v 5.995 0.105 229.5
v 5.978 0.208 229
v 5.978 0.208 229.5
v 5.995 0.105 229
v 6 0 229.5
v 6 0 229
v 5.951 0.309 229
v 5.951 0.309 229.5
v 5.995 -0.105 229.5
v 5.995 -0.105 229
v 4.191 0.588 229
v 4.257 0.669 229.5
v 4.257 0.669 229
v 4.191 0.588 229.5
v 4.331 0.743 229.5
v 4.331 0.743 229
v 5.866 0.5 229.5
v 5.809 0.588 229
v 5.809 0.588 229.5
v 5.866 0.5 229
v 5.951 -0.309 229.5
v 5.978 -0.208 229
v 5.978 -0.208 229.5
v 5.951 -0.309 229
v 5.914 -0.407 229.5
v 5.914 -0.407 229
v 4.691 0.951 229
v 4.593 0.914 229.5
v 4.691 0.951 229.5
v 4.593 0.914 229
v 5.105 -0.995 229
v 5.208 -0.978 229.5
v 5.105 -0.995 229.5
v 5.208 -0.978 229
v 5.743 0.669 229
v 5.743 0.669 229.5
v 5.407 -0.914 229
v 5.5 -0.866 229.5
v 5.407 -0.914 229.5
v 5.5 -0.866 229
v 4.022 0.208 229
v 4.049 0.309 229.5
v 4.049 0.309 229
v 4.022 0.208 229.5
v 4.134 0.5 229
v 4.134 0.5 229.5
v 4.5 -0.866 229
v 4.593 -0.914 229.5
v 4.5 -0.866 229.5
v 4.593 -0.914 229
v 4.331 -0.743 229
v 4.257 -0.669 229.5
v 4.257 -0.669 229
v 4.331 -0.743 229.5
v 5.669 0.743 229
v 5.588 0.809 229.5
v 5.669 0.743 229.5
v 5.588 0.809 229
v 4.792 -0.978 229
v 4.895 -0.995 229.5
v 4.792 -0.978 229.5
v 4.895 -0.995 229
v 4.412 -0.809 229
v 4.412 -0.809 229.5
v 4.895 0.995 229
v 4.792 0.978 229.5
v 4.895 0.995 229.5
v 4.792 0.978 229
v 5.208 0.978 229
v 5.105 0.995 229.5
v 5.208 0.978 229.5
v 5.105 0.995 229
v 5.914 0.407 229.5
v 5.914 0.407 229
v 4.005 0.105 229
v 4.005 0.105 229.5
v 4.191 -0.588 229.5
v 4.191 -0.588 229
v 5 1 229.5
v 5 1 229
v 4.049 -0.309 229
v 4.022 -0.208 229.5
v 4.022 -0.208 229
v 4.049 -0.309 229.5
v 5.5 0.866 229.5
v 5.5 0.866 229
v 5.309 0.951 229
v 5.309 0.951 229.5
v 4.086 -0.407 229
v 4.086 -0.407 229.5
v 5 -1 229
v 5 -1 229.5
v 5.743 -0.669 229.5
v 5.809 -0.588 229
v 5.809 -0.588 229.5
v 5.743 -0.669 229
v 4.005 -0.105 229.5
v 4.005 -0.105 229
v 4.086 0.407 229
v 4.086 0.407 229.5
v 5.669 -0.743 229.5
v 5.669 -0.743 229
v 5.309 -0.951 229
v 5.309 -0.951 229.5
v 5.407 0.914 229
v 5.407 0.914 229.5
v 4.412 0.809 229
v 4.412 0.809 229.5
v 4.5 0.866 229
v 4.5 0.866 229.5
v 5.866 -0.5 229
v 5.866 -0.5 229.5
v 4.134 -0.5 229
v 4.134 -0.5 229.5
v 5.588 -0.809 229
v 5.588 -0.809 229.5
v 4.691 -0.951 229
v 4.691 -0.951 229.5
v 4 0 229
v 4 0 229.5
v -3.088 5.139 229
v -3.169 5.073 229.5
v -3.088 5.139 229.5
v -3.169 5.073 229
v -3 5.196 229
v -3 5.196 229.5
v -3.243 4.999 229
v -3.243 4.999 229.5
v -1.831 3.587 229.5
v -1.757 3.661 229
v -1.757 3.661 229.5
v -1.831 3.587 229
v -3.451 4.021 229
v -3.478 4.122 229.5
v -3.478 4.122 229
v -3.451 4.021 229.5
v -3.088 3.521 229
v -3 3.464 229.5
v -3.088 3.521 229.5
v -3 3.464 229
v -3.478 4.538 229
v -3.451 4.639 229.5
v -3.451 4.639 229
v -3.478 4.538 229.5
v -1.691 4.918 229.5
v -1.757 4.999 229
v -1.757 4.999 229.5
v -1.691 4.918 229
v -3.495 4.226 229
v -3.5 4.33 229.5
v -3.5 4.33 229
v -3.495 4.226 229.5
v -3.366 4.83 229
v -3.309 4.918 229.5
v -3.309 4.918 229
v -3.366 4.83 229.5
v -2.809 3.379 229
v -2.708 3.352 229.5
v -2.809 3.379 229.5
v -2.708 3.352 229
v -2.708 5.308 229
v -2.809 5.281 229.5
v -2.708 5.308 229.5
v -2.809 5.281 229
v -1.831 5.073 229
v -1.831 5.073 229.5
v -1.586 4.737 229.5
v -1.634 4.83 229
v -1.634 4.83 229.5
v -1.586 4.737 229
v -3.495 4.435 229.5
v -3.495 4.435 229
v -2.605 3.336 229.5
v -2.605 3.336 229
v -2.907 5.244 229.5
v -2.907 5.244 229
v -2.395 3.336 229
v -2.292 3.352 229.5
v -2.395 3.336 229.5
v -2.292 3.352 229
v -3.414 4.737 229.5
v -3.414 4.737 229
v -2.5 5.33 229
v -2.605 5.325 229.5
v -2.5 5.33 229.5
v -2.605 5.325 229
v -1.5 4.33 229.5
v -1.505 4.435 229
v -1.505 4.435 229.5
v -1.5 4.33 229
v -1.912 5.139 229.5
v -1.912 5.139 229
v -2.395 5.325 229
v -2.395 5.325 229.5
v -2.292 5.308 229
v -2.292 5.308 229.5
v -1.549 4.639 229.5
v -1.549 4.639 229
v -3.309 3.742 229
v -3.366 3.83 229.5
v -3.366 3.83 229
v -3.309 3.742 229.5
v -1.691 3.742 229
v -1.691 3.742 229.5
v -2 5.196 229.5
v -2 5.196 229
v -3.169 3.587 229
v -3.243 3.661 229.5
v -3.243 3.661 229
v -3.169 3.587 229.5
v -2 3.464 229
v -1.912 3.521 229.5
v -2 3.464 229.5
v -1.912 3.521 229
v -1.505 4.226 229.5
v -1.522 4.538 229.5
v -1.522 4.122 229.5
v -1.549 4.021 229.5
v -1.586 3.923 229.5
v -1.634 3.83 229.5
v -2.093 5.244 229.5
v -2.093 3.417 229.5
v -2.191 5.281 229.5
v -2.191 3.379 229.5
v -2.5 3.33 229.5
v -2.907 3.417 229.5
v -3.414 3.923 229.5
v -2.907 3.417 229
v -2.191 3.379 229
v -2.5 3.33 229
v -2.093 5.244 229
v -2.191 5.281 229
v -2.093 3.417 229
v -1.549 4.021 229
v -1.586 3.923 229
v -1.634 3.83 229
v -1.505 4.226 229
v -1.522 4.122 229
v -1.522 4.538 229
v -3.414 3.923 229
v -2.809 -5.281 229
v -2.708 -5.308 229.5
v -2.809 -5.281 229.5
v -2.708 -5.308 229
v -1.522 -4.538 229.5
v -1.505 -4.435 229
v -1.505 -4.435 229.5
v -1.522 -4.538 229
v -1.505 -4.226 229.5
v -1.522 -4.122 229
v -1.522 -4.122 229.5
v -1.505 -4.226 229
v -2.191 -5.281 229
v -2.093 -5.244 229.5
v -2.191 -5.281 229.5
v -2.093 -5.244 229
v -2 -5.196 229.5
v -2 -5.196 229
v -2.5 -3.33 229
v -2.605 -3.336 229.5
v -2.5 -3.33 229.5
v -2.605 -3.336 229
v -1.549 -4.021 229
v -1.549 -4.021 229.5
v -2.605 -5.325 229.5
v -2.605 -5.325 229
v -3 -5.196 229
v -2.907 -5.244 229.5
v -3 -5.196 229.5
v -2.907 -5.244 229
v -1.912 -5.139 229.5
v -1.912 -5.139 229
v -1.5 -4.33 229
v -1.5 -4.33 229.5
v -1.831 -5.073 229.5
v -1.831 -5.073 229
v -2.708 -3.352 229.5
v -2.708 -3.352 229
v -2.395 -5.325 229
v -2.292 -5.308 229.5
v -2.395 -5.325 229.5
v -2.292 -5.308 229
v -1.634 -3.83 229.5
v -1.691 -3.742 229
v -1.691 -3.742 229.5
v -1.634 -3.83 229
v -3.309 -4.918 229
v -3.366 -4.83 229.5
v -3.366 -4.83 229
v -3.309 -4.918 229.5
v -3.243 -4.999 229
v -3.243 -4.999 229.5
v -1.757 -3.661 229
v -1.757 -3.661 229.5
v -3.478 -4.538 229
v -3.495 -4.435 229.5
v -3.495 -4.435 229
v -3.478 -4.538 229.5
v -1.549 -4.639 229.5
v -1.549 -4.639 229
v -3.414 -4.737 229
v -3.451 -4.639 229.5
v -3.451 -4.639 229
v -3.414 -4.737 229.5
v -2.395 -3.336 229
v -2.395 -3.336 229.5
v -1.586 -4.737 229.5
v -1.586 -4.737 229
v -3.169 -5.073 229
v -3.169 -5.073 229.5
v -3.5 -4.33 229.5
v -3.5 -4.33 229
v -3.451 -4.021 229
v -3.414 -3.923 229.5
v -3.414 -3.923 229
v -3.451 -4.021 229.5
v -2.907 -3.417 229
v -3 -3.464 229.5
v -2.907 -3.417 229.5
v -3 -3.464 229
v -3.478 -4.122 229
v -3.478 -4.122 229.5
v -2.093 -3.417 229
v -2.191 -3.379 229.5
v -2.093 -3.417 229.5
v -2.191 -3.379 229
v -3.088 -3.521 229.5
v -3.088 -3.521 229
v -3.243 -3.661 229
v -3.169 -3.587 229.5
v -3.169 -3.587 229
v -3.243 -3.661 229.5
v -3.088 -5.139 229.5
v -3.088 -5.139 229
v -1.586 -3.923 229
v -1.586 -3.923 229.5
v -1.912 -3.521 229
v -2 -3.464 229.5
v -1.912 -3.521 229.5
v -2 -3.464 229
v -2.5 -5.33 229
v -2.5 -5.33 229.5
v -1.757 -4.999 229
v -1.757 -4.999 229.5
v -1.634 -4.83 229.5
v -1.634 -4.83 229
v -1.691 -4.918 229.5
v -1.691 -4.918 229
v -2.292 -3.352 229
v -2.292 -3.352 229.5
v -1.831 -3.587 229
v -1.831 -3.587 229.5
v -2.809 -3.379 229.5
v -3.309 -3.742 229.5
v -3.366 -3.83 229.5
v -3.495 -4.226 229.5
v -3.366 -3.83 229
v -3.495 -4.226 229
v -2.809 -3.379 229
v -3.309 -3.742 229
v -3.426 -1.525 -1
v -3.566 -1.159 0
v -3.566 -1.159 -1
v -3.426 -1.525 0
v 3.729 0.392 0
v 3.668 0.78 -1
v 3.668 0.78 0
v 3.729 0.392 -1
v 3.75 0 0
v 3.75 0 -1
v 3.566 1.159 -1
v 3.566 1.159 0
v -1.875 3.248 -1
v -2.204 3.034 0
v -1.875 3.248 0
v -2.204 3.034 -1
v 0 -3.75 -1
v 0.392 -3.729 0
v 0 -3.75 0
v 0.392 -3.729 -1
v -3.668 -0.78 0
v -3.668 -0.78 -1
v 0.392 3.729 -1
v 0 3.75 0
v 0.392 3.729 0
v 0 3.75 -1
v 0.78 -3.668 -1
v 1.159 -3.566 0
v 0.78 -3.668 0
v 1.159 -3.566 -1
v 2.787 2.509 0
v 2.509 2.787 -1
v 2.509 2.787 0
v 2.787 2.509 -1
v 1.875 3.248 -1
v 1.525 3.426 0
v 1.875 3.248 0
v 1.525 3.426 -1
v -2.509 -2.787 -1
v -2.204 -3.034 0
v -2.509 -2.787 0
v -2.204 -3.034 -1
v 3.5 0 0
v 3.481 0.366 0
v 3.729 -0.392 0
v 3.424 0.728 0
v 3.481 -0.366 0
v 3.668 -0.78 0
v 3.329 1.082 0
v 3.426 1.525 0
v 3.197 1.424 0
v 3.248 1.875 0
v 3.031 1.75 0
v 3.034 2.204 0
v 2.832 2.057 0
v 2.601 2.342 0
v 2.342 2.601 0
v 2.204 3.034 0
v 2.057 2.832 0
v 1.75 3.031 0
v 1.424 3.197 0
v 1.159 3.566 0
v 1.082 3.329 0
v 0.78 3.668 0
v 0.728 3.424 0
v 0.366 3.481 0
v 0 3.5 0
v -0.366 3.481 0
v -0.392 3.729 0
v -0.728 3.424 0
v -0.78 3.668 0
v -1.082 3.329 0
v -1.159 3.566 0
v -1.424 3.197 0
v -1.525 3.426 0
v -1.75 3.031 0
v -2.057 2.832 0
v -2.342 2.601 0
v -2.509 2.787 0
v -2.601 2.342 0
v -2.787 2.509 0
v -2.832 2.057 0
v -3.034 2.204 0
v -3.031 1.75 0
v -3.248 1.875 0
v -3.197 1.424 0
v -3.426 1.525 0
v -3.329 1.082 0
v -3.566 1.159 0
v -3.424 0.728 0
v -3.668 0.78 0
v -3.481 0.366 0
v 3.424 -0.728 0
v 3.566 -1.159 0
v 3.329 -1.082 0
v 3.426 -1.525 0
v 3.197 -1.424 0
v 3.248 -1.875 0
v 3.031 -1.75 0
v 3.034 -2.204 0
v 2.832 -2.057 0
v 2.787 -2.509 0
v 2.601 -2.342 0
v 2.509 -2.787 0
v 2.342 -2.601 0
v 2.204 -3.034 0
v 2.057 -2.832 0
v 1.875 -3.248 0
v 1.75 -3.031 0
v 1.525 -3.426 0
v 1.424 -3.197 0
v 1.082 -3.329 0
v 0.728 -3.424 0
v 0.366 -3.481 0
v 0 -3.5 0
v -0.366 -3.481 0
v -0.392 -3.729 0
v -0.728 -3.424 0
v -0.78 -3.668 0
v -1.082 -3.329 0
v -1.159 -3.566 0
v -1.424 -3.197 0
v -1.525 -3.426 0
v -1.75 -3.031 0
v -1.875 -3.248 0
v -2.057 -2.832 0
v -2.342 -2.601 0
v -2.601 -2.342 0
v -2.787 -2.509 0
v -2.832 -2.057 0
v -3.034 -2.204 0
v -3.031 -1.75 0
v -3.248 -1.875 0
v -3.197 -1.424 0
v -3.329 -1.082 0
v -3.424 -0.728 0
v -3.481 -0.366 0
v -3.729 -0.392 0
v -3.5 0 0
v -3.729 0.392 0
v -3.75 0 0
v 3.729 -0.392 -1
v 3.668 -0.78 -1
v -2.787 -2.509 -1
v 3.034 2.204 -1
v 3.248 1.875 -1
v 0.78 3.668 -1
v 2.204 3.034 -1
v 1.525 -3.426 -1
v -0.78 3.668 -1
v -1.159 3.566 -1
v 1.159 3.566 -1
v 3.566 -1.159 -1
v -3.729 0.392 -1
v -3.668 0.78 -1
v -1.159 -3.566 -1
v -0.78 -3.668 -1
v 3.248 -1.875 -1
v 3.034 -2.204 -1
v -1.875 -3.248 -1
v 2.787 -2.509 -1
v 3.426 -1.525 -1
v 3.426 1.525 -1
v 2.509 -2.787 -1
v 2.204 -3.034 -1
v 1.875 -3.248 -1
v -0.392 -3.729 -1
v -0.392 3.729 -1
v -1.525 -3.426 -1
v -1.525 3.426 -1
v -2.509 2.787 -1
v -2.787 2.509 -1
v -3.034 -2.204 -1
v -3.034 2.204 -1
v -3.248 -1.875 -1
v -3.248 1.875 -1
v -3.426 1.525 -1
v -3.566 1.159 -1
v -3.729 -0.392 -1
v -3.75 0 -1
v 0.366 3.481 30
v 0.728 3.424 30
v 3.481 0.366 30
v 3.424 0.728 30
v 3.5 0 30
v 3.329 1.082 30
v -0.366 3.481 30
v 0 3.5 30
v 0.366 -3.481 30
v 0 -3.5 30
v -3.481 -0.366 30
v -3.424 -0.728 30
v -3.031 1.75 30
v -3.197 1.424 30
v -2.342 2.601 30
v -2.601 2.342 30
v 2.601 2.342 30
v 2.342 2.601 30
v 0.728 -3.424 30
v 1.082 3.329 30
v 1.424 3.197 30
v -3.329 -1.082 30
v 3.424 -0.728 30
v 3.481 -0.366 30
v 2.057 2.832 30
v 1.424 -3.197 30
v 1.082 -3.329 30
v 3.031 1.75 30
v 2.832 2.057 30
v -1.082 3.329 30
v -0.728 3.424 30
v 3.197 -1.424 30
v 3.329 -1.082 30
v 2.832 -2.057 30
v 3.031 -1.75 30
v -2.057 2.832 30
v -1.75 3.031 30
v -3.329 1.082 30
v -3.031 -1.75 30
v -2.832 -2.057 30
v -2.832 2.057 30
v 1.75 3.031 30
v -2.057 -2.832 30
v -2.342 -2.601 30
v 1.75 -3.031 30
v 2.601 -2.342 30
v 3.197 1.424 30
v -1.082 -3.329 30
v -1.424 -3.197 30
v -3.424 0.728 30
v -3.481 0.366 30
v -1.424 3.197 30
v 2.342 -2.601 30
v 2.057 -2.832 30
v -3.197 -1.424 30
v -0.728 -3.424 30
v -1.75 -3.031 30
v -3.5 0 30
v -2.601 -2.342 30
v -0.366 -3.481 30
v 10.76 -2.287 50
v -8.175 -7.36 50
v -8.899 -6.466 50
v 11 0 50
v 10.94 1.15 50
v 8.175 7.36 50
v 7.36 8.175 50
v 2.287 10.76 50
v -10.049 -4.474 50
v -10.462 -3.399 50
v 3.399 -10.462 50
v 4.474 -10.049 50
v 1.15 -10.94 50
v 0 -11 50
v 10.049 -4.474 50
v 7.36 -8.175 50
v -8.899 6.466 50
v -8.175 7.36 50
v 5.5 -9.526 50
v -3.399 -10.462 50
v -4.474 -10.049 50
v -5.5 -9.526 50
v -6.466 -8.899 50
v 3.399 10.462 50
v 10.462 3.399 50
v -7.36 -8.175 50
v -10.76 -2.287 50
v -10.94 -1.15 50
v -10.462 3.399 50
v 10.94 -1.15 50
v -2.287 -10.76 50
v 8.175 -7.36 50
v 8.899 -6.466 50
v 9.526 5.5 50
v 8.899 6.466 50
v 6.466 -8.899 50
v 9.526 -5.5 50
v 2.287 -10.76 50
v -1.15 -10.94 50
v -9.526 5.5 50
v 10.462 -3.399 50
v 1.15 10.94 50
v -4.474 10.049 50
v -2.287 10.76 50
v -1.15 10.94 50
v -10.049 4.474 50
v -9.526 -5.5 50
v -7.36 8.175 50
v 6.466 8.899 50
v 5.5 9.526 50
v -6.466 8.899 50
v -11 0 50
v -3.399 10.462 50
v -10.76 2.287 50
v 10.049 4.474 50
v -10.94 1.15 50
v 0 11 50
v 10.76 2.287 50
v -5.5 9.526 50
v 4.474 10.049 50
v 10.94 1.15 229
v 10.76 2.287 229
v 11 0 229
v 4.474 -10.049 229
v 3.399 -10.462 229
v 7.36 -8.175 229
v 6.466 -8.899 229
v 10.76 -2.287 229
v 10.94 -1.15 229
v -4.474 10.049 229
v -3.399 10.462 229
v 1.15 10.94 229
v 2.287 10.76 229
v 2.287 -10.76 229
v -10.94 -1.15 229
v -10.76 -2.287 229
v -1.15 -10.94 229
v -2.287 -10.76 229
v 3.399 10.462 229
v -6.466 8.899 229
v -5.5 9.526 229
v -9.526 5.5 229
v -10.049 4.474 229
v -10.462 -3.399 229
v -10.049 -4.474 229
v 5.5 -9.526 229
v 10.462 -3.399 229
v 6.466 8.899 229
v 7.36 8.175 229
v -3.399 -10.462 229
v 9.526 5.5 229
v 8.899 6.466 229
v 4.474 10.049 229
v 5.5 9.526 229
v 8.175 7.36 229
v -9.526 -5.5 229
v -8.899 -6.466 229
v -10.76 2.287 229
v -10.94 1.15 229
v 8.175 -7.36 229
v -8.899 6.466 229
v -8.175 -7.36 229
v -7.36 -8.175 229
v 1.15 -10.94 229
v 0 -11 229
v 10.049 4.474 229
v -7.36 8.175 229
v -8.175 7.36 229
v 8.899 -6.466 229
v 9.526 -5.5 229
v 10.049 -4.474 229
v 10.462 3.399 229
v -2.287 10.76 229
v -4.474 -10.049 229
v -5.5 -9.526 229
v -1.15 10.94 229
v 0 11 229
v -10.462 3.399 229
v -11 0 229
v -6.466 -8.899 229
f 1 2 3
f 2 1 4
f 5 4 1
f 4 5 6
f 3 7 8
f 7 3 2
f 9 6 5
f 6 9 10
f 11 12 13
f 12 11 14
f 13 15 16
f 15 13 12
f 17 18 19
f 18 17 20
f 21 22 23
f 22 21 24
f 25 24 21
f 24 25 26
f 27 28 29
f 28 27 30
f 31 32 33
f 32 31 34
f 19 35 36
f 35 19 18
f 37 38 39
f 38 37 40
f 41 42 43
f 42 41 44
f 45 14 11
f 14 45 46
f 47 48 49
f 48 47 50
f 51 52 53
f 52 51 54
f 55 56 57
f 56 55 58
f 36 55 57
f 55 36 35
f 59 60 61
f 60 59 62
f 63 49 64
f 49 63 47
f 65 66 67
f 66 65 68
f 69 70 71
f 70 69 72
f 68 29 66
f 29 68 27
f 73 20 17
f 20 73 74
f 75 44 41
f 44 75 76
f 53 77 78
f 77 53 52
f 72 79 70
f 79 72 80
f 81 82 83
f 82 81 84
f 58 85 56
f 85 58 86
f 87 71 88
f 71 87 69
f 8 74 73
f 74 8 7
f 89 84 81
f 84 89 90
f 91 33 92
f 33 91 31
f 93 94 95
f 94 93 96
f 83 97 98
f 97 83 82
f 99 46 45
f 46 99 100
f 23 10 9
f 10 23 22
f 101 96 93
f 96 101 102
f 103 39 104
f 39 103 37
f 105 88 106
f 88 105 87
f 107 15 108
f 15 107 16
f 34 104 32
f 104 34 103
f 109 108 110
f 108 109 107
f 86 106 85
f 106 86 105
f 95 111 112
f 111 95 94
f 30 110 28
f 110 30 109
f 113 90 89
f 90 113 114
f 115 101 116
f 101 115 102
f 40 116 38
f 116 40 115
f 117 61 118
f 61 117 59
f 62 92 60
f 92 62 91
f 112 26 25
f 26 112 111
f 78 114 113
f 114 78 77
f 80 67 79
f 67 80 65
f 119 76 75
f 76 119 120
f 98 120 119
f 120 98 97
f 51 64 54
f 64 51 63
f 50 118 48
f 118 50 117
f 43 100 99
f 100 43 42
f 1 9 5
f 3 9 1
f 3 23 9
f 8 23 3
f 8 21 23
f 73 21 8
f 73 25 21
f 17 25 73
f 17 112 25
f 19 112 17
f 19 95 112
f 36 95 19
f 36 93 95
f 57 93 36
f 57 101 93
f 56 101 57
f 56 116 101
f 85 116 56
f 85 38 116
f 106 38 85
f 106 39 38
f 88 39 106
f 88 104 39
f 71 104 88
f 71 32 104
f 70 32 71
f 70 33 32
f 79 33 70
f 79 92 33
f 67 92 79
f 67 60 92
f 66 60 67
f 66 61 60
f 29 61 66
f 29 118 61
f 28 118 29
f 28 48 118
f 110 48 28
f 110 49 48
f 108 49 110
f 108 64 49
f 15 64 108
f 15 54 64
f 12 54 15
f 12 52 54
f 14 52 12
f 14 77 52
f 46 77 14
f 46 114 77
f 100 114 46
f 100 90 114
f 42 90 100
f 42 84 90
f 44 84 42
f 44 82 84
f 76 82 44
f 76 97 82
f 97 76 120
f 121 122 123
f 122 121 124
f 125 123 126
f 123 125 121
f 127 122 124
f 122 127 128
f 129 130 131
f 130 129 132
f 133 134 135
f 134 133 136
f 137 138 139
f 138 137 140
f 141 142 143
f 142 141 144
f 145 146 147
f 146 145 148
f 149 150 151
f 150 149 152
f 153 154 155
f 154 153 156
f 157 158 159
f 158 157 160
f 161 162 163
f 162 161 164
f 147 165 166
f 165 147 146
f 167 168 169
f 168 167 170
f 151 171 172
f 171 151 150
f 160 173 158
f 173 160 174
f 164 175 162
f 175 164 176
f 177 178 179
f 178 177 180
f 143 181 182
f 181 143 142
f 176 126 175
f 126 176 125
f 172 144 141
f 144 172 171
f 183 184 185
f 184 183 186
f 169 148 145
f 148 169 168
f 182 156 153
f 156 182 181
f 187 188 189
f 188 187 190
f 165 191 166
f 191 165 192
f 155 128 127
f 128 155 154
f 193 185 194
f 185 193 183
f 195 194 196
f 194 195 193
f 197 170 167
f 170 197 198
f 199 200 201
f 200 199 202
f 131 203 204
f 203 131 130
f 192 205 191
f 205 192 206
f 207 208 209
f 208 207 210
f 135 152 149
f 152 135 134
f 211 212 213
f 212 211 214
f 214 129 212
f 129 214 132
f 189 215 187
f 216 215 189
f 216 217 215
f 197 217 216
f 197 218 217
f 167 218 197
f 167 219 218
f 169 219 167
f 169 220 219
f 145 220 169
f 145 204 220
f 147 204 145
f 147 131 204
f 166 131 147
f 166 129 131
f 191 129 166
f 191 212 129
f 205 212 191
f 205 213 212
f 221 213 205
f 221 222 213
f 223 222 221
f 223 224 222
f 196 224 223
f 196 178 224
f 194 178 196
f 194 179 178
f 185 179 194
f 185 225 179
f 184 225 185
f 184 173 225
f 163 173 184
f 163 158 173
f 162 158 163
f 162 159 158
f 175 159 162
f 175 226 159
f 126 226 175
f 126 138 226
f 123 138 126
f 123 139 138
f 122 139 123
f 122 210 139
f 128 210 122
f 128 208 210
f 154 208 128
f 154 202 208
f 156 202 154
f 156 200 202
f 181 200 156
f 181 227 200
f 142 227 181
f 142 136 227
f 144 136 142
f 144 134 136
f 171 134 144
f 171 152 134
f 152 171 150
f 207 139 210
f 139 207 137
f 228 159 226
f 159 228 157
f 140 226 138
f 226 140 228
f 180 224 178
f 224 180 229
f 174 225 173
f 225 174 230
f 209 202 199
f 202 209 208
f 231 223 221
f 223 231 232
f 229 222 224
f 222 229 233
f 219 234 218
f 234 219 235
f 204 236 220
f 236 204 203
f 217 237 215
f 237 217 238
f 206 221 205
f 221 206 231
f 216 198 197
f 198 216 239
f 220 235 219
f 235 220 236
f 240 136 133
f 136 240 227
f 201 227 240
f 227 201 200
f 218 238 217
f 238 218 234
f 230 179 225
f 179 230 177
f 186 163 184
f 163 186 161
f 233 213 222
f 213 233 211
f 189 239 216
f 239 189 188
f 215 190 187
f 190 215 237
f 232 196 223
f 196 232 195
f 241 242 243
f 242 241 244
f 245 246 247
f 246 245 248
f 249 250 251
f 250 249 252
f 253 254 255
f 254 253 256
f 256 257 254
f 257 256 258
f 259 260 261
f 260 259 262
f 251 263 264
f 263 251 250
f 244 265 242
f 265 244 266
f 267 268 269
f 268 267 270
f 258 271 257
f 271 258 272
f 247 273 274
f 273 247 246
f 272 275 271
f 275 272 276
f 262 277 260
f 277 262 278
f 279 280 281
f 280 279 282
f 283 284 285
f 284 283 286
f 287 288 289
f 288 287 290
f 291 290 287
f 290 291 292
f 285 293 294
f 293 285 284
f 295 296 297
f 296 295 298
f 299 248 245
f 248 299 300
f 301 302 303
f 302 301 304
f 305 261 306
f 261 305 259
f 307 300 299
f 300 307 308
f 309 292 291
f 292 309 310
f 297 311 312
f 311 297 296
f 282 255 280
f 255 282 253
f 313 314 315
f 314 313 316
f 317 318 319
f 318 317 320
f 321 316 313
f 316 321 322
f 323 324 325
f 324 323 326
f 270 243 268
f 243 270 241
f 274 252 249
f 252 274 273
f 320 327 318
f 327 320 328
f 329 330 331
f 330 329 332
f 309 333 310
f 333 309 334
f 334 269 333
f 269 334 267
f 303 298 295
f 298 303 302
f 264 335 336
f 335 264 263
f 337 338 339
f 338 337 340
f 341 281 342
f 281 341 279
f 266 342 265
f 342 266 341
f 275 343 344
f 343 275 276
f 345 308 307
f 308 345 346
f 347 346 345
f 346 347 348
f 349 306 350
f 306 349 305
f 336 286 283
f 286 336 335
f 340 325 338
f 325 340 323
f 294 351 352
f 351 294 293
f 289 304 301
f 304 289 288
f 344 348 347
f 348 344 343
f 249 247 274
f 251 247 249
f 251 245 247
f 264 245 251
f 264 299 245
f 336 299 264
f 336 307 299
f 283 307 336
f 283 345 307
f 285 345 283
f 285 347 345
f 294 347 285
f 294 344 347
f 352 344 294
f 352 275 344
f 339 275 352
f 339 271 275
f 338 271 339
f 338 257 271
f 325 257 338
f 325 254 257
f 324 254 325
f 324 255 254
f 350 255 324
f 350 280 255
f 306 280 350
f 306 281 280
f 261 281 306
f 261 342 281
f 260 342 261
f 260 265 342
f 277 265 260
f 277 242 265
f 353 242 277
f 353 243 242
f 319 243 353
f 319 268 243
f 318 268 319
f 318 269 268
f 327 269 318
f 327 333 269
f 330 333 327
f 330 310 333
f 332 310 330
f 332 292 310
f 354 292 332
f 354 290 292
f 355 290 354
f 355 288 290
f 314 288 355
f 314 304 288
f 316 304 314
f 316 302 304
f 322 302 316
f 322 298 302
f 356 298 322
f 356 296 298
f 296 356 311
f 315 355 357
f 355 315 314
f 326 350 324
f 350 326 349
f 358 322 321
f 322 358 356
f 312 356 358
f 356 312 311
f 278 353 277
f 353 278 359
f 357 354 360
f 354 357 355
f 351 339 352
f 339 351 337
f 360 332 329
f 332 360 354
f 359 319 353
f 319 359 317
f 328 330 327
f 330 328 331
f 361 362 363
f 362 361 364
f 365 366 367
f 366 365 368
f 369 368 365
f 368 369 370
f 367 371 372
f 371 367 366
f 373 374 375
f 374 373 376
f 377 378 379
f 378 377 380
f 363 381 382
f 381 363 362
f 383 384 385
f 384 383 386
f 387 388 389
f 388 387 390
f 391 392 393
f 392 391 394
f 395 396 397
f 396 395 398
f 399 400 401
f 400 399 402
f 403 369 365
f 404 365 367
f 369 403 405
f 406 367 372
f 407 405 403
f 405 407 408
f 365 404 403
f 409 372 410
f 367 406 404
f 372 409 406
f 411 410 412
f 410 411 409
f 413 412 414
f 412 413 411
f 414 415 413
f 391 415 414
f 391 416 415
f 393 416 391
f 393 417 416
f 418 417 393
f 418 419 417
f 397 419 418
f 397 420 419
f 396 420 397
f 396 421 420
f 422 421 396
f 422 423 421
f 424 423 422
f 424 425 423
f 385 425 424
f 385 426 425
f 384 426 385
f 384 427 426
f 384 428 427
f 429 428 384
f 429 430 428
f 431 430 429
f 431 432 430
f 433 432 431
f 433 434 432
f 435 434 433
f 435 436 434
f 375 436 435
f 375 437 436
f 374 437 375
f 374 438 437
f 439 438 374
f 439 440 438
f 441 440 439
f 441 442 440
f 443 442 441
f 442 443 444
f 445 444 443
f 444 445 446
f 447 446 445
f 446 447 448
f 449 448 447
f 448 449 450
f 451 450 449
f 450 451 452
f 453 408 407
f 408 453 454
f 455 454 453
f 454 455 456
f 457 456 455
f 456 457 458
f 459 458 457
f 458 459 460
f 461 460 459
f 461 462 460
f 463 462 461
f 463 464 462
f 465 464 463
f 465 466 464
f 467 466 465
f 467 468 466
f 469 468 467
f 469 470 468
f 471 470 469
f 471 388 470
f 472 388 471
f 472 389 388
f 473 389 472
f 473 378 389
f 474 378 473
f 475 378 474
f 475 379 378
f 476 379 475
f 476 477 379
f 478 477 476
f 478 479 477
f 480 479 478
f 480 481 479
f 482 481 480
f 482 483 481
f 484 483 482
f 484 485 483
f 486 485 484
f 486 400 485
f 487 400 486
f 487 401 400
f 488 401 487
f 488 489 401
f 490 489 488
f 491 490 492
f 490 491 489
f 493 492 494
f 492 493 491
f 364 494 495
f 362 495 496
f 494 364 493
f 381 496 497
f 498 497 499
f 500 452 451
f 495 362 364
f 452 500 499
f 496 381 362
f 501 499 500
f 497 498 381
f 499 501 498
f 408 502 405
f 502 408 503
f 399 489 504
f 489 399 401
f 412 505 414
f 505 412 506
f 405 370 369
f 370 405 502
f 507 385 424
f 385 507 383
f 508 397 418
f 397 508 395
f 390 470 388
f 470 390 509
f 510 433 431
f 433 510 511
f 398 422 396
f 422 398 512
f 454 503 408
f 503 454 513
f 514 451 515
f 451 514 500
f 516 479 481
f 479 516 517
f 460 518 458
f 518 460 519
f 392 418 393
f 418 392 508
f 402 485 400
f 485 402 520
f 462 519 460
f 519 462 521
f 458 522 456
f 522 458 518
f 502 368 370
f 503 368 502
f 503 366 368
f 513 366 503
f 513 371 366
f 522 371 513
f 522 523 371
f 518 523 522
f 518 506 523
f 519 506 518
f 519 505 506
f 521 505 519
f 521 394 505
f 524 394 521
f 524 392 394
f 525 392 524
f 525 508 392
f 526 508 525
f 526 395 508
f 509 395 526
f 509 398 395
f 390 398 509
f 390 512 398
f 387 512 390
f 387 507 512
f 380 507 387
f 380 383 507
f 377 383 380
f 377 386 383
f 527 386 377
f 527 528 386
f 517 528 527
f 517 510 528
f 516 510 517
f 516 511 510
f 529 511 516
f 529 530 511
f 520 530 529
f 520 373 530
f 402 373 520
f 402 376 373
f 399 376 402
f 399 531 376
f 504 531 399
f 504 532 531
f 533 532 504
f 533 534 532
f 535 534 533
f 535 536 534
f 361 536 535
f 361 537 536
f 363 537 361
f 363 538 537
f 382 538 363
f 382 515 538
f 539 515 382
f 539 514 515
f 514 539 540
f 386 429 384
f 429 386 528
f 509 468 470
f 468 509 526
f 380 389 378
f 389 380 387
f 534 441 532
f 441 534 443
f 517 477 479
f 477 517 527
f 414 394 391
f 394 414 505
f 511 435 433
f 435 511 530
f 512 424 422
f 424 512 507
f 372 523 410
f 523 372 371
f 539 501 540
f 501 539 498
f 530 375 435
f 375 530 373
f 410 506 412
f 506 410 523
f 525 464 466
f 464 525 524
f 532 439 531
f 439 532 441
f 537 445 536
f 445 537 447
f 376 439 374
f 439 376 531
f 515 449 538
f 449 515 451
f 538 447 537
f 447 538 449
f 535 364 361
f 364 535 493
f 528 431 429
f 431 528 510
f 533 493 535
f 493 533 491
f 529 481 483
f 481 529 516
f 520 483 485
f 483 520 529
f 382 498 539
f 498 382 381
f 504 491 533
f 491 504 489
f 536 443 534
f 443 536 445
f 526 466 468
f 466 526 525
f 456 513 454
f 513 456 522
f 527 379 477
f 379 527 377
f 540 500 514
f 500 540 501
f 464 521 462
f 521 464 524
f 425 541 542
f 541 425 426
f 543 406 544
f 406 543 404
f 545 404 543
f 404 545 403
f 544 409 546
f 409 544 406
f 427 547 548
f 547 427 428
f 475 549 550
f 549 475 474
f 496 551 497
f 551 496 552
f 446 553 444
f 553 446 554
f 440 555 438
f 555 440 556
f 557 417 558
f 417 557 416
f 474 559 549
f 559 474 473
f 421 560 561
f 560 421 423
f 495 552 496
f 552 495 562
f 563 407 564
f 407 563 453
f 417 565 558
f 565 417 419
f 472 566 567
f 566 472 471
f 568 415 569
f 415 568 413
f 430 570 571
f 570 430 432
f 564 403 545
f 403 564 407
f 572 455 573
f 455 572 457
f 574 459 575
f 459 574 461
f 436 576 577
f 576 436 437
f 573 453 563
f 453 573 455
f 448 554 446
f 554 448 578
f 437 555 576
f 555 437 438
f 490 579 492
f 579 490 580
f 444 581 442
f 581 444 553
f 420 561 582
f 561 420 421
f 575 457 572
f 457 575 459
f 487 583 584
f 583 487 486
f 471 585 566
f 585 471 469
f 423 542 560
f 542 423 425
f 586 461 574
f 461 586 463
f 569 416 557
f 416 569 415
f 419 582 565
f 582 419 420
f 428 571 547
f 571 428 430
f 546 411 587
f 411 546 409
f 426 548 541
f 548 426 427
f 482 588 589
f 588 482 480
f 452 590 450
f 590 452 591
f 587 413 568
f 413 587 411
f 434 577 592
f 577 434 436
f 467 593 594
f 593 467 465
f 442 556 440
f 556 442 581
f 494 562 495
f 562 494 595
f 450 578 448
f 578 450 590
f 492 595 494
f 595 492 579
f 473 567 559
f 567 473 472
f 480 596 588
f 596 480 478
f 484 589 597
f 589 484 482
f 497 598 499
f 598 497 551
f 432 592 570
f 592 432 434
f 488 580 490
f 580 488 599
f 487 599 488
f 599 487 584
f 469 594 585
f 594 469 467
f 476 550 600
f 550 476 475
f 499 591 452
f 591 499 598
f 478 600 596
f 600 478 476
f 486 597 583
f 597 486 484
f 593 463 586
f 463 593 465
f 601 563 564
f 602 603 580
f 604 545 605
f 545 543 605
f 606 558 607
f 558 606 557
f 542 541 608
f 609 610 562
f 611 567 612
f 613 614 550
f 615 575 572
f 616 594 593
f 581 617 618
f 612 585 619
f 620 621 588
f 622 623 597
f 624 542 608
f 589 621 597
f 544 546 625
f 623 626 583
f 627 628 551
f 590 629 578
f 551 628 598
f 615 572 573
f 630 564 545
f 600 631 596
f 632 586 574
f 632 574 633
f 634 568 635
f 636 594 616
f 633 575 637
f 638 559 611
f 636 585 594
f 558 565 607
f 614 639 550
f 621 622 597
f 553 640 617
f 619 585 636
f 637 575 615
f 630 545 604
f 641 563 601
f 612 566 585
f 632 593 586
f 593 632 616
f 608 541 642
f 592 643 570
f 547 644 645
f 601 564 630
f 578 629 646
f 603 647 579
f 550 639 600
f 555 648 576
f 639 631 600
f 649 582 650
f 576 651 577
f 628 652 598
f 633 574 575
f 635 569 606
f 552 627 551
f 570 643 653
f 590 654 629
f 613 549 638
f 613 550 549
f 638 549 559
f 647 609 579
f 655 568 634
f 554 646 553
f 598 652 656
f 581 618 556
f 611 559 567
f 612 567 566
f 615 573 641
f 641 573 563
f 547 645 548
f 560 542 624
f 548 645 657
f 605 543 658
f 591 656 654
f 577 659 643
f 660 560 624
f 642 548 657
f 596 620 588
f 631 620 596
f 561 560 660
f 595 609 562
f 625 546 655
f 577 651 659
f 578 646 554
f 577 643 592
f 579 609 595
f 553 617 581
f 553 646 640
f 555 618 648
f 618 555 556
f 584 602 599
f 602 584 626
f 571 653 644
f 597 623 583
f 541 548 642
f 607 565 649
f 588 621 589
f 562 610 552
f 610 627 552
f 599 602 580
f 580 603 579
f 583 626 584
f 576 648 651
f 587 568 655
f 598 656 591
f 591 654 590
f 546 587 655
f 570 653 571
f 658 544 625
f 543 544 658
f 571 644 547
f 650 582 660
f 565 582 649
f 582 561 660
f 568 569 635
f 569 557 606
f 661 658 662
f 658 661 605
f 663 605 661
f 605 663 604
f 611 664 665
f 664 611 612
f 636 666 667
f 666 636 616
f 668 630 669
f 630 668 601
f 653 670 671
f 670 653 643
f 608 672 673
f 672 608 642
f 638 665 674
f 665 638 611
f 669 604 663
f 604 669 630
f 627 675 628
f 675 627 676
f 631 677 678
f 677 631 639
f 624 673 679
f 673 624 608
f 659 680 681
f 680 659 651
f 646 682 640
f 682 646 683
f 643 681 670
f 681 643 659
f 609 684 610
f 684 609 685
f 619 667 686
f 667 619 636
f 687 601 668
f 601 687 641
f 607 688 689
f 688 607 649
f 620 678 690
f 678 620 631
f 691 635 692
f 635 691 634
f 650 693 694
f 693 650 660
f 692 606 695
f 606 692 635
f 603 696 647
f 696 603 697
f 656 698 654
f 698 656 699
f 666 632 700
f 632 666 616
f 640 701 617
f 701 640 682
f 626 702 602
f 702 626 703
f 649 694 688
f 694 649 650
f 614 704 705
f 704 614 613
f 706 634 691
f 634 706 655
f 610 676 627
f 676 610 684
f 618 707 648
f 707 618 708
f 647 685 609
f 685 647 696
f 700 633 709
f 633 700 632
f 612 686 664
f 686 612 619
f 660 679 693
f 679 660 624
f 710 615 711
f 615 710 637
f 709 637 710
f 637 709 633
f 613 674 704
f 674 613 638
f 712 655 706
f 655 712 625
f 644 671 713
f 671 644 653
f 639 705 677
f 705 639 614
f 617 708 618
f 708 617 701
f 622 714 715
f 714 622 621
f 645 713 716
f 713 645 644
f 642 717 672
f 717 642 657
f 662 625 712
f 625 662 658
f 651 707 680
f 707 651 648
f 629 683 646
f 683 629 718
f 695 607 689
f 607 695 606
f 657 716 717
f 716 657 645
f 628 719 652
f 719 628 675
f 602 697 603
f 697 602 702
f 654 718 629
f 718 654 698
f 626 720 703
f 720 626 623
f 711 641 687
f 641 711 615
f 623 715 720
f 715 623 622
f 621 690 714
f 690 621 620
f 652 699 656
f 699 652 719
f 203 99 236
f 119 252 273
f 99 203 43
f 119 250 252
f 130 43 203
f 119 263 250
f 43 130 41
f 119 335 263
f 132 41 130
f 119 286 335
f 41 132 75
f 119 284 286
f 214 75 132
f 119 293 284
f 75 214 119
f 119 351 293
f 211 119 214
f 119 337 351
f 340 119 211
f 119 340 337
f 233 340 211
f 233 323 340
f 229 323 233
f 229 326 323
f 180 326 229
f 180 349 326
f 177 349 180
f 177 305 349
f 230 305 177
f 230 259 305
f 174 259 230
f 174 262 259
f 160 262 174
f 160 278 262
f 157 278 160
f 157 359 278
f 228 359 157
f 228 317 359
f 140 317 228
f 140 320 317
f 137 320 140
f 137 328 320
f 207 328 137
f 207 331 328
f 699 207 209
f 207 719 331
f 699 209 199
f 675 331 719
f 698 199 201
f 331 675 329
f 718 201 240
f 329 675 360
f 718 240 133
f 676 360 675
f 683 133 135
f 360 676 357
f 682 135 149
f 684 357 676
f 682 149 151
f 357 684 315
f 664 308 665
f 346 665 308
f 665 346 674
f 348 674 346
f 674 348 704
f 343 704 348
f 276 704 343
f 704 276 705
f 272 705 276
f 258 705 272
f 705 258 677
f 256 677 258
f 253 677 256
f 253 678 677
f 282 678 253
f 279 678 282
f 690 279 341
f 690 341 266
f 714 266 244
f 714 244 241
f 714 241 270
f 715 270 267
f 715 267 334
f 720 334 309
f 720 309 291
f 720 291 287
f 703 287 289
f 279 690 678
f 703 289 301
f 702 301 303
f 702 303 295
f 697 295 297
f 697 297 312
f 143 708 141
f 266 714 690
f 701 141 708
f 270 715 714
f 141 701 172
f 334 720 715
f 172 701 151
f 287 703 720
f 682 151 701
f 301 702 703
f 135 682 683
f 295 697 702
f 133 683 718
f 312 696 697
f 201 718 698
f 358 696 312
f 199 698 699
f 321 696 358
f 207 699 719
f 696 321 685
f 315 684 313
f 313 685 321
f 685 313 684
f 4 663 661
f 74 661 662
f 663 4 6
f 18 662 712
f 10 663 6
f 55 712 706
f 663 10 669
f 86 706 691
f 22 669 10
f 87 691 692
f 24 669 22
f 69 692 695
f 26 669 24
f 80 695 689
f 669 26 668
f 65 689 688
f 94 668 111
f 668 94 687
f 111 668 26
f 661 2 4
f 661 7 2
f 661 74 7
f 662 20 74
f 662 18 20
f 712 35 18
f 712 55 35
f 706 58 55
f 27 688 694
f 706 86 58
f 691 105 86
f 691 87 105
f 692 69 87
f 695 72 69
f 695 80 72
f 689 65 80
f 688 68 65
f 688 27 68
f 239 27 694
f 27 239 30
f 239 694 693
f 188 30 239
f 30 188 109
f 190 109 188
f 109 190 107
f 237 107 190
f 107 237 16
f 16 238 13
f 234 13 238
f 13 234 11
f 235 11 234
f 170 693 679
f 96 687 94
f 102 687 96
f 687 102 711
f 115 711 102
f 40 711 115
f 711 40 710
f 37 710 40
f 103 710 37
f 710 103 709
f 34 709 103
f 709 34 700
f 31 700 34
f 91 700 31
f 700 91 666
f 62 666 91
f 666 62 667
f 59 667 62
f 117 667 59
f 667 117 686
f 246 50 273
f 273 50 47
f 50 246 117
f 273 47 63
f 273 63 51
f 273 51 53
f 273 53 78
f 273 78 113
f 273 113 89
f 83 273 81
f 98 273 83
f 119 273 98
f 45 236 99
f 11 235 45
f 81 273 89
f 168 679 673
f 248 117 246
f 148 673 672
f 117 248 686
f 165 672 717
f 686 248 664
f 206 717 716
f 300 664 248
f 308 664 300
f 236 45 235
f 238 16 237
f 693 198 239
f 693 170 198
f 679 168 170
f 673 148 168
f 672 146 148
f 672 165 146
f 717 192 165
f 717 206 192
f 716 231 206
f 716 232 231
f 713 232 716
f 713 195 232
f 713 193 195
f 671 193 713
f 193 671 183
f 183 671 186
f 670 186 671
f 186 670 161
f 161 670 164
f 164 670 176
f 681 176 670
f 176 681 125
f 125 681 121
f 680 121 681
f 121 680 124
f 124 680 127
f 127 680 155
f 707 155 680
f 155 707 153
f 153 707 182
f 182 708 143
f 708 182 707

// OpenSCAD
// file: _params.scad
// =========================================================================
// 공유 파라미터 (모든 개별 부품 파일에서 include)
// 메인 어셈블리: cup_z_x_catrage_frame_water_mic_anti_3030.scad 에서 추출
// 프레임: 600 × 420 × 700mm (3030 프로파일, Y=0 대칭)
// =========================================================================

$fn = 60;  // 부품 출력용 고해상도
GLOBAL_TOLERANCE = 0.2;

// --- [1] 하부 기성품 및 원통 파라미터 ---
X_RAIL_LEN = 290.0;
X_BLOCK_W = 30.0; X_BLOCK_L = 32.0;   // 신규 X슬라이더 블록 (폭 30mm × 길이 32mm)
X_PITCH_X = 20.0; X_PITCH_Y = 20.0;   // 체결 홀 피치 (20 × 20mm, M3 나사탭 4개)
X_RAIL_W = 30.0;  X_RAIL_H = 20.0;   // 레일 폭 30mm (레일 바닥~블록 윗면 높이 29mm 반영)
X_TOTAL_H = 29.0;                    // 레일 바닥에서 슬라이더 블록 윗면까지의 높이

MOTOR_W = 42.0;      MOTOR_PITCH = 31.0; MOTOR_HOLE_D = 3.5;    
MOTOR_BOSS_D = 22.0; MOTOR_BOSS_H = 2.0; SCREW_D = 8.0;         
MOT_BODY_L = 41.0;   SHAFT_L = 24.0;     // 실측 NEMA17 몸통 41mm / 축 돌출 24mm

CUP_ID = 99.5;  CUP_WALL = 5.0; CUP_OD = 110.0;     // 아크릴 원통 OD110/ID100
CUP_H = 180.0;   CAGE_H = 60.0;  FLOOR_H = 10.0; PISTON_H = 20.0;     

LIP_D = 30.0;    LIP_H = 5.0;    LEAK_DRAIN_D = 4.0;    
GUIDE_PIPE_D = 8.0; BUSHING_OD = 12.0; BUSHING_H = 8.0;       
DRAIN_RADIUS = 35.0; DRAIN_D = 8.0;        

Y_OFFSET = 85.0; BRKT_H = 12.0; BRKT_D = 122.0; BRKT_ID = 62.0; Z_MOUNT_PCD = 86.0;   

// --- [2] 아크릴 파이프 및 상부 카트리지 ---
ACRYL_ID = 100.0; ACRYL_T = 5.0; ACRYL_OD = ACRYL_ID + (ACRYL_T * 2);  // OD110 (아크릴집 106 재고없음 → 컵과 동일 규격)

REVOLVER_PCD = 240.0;     // 인접 카트리지 웹 9.8mm 확보 (OD110 대응, 230→240)
CARTRIDGE_OD = REVOLVER_PCD + ACRYL_OD + 8; 
TOP_PLATE_H = 15.0;       // 아크릴 15T 통판 (보스홀 단 깊이 10mm)

HUB_D = 60.0;            
SHAFT_D = 12.0;          
HUB_WALL = 4.0;          
HUB_H = 15.0;             // 아크릴 5T × 3장 적층 — 파이프 130mm 대응
POCKET_DEPTH = 5.0;
MID_HUB_Z = 63.5;          // 중단 허브 하면 Z (벨트 중심 Z=71.0mm 정렬, 풀리 상단 Z=75.0mm = 축상단-1mm)
UPPER_HUB_Z = 135.0;       // 상단 허브 하면 Z (전체 135+15=150 유지)
BOSS_OD = 35.0;
BOSS_H = 11.0;             // 보스11 + 와셔1 = 12, 리세스10 → 허브 2mm 공중

// --- [3] GT2 벨트 구동 시스템 ---
GT2_PITCH     = 2.0;
GT2_BELT_W    = 6.0;
BIG_PULLEY_TEETH = 566;
BIG_PULLEY_PD = BIG_PULLEY_TEETH * GT2_PITCH / PI;
BIG_PULLEY_OD = BIG_PULLEY_PD + 1.0;
SMALL_PULLEY_TEETH = 20;
SMALL_PULLEY_PD = SMALL_PULLEY_TEETH * GT2_PITCH / PI;
SMALL_PULLEY_OD = SMALL_PULLEY_PD + 1.0;

BELT_MOTOR_X = -300;
BELT_MOTOR_Y = -155.5;
BRKT_MOTOR_H = 25.0;
BRKT_MOTOR_W = 45.0;        // 브래킷 폭 45mm (프로파일 간섭 회피 복원)
SLOT_LEN = 10.0;
FLAG_W = 15.0;  FLAG_H = 8.0;  FLAG_T = 1.5;

X_POS_MEASURE = 170.0;   // 측정 브래킷 X좌표 (X_M~X_R 정중앙, X대칭)

// --- [4] 3030 프레임 경계 (600×430×700mm) ---
PF = 30;             // 3030 알루미늄 프로파일
WASHER_T = 1.0;     

X_L = -320;
X_M = 60;
X_R = 250;
Y_F = -210;          // 전방 (대칭: -210+30=-180, Y=0 중심)
Y_B = 180;           // 후방 (대칭: 180+30=210, Y=0 중심) — 메인파일과 동기화

Z_BOT = -480;
Z_RAIL = -322;
Z_MID = -TOP_PLATE_H - PF;
Z_TOP = 220;

SUPPORT_PILLAR_H = Z_TOP - PF;

SHAFT_SQ = 20;       // 2020 사각 회전축

// 사각 축 홀 크기
SQ = SHAFT_SQ + GLOBAL_TOLERANCE;  // 20.2mm

// --- 리볼버/컵 축 정렬 (보스홀=판 중심에 리볼버 정렬) ---
REVOLVER_CX = (X_L + X_M + PF)/2;        // 판 중심 = 보스홀 = 리볼버 회전축 (-115)
DROP_X      = REVOLVER_CX + REVOLVER_PCD/2;  // 링 드롭 / 컵 적재 축 (+5)

FLANGE_Z = 52.0;       // 모터 전면 안착 높이 (Z=52mm -> 축 상단 Z=76mm, 풀리 결합)

// --- [5] 모터 체결홀 (이미 제작 완료된 15T 상판 원본 도면 수치 100% 유지) ---
MOTOR_BOLT_PITCH     = 25.0;      // Y피치 (Y = ±12.5mm)
MOTOR_BOLT_X_NOMINAL = X_L + 55;  // 1열: 상판 좌단 55 (모터축 기준 +35mm = X=-265mm)
MOTOR_BOLT_X_SHIFT   = X_L + 40;  // 2열: 상판 좌단 40 (모터축 기준 +20mm = X=-280mm)

// 모터 마운트 볼트 카운터보어 (단볼트용 — 브래킷 두께 25 중 깊게 파냄)
MOTOR_CB_D     = 6.5;            // M3 캡볼트 머리 클리어런스
MOTOR_CB_DEPTH = 19;             // 카운터보어 깊이 (잔여 통과 6mm → M3×10 단볼트)
// main file
// =========================================================================
// [구매] Earthworks M50 측정 마이크
// 구매: Earthworks M50 (229 × ø22mm, 팁 ø7mm)
// 메인 파일 m50_mic_dummy() 그대로 복사
// 원점: 팁 선단 = Z=0, +Z 방향으로 본체 연장
// =========================================================================
include <_params.scad>

BD=22; TD=7;
TIP_L=30; TAPER_L=20; BODY_L=155; XLR_L=24;  // 합계 229mm

color([0.3,0.3,0.3])    translate([0,0,-1])            cylinder(d=TD+0.5, h=1);
color([0.82,0.82,0.82])                                cylinder(d=TD, h=TIP_L);
color([0.82,0.82,0.82]) translate([0,0,TIP_L])         cylinder(d1=TD, d2=BD, h=TAPER_L);
color([0.80,0.80,0.80]) translate([0,0,TIP_L+TAPER_L]) cylinder(d=BD, h=BODY_L);
color([0.25,0.25,0.25]) translate([0,0,TIP_L+TAPER_L+BODY_L]) cylinder(d=BD, h=XLR_L);
color([0.15,0.15,0.15]) translate([0,0,229-0.5])
    for(a=[0,120,240]) rotate([0,0,a]) translate([5,0,0]) cylinder(d=2, h=1);
